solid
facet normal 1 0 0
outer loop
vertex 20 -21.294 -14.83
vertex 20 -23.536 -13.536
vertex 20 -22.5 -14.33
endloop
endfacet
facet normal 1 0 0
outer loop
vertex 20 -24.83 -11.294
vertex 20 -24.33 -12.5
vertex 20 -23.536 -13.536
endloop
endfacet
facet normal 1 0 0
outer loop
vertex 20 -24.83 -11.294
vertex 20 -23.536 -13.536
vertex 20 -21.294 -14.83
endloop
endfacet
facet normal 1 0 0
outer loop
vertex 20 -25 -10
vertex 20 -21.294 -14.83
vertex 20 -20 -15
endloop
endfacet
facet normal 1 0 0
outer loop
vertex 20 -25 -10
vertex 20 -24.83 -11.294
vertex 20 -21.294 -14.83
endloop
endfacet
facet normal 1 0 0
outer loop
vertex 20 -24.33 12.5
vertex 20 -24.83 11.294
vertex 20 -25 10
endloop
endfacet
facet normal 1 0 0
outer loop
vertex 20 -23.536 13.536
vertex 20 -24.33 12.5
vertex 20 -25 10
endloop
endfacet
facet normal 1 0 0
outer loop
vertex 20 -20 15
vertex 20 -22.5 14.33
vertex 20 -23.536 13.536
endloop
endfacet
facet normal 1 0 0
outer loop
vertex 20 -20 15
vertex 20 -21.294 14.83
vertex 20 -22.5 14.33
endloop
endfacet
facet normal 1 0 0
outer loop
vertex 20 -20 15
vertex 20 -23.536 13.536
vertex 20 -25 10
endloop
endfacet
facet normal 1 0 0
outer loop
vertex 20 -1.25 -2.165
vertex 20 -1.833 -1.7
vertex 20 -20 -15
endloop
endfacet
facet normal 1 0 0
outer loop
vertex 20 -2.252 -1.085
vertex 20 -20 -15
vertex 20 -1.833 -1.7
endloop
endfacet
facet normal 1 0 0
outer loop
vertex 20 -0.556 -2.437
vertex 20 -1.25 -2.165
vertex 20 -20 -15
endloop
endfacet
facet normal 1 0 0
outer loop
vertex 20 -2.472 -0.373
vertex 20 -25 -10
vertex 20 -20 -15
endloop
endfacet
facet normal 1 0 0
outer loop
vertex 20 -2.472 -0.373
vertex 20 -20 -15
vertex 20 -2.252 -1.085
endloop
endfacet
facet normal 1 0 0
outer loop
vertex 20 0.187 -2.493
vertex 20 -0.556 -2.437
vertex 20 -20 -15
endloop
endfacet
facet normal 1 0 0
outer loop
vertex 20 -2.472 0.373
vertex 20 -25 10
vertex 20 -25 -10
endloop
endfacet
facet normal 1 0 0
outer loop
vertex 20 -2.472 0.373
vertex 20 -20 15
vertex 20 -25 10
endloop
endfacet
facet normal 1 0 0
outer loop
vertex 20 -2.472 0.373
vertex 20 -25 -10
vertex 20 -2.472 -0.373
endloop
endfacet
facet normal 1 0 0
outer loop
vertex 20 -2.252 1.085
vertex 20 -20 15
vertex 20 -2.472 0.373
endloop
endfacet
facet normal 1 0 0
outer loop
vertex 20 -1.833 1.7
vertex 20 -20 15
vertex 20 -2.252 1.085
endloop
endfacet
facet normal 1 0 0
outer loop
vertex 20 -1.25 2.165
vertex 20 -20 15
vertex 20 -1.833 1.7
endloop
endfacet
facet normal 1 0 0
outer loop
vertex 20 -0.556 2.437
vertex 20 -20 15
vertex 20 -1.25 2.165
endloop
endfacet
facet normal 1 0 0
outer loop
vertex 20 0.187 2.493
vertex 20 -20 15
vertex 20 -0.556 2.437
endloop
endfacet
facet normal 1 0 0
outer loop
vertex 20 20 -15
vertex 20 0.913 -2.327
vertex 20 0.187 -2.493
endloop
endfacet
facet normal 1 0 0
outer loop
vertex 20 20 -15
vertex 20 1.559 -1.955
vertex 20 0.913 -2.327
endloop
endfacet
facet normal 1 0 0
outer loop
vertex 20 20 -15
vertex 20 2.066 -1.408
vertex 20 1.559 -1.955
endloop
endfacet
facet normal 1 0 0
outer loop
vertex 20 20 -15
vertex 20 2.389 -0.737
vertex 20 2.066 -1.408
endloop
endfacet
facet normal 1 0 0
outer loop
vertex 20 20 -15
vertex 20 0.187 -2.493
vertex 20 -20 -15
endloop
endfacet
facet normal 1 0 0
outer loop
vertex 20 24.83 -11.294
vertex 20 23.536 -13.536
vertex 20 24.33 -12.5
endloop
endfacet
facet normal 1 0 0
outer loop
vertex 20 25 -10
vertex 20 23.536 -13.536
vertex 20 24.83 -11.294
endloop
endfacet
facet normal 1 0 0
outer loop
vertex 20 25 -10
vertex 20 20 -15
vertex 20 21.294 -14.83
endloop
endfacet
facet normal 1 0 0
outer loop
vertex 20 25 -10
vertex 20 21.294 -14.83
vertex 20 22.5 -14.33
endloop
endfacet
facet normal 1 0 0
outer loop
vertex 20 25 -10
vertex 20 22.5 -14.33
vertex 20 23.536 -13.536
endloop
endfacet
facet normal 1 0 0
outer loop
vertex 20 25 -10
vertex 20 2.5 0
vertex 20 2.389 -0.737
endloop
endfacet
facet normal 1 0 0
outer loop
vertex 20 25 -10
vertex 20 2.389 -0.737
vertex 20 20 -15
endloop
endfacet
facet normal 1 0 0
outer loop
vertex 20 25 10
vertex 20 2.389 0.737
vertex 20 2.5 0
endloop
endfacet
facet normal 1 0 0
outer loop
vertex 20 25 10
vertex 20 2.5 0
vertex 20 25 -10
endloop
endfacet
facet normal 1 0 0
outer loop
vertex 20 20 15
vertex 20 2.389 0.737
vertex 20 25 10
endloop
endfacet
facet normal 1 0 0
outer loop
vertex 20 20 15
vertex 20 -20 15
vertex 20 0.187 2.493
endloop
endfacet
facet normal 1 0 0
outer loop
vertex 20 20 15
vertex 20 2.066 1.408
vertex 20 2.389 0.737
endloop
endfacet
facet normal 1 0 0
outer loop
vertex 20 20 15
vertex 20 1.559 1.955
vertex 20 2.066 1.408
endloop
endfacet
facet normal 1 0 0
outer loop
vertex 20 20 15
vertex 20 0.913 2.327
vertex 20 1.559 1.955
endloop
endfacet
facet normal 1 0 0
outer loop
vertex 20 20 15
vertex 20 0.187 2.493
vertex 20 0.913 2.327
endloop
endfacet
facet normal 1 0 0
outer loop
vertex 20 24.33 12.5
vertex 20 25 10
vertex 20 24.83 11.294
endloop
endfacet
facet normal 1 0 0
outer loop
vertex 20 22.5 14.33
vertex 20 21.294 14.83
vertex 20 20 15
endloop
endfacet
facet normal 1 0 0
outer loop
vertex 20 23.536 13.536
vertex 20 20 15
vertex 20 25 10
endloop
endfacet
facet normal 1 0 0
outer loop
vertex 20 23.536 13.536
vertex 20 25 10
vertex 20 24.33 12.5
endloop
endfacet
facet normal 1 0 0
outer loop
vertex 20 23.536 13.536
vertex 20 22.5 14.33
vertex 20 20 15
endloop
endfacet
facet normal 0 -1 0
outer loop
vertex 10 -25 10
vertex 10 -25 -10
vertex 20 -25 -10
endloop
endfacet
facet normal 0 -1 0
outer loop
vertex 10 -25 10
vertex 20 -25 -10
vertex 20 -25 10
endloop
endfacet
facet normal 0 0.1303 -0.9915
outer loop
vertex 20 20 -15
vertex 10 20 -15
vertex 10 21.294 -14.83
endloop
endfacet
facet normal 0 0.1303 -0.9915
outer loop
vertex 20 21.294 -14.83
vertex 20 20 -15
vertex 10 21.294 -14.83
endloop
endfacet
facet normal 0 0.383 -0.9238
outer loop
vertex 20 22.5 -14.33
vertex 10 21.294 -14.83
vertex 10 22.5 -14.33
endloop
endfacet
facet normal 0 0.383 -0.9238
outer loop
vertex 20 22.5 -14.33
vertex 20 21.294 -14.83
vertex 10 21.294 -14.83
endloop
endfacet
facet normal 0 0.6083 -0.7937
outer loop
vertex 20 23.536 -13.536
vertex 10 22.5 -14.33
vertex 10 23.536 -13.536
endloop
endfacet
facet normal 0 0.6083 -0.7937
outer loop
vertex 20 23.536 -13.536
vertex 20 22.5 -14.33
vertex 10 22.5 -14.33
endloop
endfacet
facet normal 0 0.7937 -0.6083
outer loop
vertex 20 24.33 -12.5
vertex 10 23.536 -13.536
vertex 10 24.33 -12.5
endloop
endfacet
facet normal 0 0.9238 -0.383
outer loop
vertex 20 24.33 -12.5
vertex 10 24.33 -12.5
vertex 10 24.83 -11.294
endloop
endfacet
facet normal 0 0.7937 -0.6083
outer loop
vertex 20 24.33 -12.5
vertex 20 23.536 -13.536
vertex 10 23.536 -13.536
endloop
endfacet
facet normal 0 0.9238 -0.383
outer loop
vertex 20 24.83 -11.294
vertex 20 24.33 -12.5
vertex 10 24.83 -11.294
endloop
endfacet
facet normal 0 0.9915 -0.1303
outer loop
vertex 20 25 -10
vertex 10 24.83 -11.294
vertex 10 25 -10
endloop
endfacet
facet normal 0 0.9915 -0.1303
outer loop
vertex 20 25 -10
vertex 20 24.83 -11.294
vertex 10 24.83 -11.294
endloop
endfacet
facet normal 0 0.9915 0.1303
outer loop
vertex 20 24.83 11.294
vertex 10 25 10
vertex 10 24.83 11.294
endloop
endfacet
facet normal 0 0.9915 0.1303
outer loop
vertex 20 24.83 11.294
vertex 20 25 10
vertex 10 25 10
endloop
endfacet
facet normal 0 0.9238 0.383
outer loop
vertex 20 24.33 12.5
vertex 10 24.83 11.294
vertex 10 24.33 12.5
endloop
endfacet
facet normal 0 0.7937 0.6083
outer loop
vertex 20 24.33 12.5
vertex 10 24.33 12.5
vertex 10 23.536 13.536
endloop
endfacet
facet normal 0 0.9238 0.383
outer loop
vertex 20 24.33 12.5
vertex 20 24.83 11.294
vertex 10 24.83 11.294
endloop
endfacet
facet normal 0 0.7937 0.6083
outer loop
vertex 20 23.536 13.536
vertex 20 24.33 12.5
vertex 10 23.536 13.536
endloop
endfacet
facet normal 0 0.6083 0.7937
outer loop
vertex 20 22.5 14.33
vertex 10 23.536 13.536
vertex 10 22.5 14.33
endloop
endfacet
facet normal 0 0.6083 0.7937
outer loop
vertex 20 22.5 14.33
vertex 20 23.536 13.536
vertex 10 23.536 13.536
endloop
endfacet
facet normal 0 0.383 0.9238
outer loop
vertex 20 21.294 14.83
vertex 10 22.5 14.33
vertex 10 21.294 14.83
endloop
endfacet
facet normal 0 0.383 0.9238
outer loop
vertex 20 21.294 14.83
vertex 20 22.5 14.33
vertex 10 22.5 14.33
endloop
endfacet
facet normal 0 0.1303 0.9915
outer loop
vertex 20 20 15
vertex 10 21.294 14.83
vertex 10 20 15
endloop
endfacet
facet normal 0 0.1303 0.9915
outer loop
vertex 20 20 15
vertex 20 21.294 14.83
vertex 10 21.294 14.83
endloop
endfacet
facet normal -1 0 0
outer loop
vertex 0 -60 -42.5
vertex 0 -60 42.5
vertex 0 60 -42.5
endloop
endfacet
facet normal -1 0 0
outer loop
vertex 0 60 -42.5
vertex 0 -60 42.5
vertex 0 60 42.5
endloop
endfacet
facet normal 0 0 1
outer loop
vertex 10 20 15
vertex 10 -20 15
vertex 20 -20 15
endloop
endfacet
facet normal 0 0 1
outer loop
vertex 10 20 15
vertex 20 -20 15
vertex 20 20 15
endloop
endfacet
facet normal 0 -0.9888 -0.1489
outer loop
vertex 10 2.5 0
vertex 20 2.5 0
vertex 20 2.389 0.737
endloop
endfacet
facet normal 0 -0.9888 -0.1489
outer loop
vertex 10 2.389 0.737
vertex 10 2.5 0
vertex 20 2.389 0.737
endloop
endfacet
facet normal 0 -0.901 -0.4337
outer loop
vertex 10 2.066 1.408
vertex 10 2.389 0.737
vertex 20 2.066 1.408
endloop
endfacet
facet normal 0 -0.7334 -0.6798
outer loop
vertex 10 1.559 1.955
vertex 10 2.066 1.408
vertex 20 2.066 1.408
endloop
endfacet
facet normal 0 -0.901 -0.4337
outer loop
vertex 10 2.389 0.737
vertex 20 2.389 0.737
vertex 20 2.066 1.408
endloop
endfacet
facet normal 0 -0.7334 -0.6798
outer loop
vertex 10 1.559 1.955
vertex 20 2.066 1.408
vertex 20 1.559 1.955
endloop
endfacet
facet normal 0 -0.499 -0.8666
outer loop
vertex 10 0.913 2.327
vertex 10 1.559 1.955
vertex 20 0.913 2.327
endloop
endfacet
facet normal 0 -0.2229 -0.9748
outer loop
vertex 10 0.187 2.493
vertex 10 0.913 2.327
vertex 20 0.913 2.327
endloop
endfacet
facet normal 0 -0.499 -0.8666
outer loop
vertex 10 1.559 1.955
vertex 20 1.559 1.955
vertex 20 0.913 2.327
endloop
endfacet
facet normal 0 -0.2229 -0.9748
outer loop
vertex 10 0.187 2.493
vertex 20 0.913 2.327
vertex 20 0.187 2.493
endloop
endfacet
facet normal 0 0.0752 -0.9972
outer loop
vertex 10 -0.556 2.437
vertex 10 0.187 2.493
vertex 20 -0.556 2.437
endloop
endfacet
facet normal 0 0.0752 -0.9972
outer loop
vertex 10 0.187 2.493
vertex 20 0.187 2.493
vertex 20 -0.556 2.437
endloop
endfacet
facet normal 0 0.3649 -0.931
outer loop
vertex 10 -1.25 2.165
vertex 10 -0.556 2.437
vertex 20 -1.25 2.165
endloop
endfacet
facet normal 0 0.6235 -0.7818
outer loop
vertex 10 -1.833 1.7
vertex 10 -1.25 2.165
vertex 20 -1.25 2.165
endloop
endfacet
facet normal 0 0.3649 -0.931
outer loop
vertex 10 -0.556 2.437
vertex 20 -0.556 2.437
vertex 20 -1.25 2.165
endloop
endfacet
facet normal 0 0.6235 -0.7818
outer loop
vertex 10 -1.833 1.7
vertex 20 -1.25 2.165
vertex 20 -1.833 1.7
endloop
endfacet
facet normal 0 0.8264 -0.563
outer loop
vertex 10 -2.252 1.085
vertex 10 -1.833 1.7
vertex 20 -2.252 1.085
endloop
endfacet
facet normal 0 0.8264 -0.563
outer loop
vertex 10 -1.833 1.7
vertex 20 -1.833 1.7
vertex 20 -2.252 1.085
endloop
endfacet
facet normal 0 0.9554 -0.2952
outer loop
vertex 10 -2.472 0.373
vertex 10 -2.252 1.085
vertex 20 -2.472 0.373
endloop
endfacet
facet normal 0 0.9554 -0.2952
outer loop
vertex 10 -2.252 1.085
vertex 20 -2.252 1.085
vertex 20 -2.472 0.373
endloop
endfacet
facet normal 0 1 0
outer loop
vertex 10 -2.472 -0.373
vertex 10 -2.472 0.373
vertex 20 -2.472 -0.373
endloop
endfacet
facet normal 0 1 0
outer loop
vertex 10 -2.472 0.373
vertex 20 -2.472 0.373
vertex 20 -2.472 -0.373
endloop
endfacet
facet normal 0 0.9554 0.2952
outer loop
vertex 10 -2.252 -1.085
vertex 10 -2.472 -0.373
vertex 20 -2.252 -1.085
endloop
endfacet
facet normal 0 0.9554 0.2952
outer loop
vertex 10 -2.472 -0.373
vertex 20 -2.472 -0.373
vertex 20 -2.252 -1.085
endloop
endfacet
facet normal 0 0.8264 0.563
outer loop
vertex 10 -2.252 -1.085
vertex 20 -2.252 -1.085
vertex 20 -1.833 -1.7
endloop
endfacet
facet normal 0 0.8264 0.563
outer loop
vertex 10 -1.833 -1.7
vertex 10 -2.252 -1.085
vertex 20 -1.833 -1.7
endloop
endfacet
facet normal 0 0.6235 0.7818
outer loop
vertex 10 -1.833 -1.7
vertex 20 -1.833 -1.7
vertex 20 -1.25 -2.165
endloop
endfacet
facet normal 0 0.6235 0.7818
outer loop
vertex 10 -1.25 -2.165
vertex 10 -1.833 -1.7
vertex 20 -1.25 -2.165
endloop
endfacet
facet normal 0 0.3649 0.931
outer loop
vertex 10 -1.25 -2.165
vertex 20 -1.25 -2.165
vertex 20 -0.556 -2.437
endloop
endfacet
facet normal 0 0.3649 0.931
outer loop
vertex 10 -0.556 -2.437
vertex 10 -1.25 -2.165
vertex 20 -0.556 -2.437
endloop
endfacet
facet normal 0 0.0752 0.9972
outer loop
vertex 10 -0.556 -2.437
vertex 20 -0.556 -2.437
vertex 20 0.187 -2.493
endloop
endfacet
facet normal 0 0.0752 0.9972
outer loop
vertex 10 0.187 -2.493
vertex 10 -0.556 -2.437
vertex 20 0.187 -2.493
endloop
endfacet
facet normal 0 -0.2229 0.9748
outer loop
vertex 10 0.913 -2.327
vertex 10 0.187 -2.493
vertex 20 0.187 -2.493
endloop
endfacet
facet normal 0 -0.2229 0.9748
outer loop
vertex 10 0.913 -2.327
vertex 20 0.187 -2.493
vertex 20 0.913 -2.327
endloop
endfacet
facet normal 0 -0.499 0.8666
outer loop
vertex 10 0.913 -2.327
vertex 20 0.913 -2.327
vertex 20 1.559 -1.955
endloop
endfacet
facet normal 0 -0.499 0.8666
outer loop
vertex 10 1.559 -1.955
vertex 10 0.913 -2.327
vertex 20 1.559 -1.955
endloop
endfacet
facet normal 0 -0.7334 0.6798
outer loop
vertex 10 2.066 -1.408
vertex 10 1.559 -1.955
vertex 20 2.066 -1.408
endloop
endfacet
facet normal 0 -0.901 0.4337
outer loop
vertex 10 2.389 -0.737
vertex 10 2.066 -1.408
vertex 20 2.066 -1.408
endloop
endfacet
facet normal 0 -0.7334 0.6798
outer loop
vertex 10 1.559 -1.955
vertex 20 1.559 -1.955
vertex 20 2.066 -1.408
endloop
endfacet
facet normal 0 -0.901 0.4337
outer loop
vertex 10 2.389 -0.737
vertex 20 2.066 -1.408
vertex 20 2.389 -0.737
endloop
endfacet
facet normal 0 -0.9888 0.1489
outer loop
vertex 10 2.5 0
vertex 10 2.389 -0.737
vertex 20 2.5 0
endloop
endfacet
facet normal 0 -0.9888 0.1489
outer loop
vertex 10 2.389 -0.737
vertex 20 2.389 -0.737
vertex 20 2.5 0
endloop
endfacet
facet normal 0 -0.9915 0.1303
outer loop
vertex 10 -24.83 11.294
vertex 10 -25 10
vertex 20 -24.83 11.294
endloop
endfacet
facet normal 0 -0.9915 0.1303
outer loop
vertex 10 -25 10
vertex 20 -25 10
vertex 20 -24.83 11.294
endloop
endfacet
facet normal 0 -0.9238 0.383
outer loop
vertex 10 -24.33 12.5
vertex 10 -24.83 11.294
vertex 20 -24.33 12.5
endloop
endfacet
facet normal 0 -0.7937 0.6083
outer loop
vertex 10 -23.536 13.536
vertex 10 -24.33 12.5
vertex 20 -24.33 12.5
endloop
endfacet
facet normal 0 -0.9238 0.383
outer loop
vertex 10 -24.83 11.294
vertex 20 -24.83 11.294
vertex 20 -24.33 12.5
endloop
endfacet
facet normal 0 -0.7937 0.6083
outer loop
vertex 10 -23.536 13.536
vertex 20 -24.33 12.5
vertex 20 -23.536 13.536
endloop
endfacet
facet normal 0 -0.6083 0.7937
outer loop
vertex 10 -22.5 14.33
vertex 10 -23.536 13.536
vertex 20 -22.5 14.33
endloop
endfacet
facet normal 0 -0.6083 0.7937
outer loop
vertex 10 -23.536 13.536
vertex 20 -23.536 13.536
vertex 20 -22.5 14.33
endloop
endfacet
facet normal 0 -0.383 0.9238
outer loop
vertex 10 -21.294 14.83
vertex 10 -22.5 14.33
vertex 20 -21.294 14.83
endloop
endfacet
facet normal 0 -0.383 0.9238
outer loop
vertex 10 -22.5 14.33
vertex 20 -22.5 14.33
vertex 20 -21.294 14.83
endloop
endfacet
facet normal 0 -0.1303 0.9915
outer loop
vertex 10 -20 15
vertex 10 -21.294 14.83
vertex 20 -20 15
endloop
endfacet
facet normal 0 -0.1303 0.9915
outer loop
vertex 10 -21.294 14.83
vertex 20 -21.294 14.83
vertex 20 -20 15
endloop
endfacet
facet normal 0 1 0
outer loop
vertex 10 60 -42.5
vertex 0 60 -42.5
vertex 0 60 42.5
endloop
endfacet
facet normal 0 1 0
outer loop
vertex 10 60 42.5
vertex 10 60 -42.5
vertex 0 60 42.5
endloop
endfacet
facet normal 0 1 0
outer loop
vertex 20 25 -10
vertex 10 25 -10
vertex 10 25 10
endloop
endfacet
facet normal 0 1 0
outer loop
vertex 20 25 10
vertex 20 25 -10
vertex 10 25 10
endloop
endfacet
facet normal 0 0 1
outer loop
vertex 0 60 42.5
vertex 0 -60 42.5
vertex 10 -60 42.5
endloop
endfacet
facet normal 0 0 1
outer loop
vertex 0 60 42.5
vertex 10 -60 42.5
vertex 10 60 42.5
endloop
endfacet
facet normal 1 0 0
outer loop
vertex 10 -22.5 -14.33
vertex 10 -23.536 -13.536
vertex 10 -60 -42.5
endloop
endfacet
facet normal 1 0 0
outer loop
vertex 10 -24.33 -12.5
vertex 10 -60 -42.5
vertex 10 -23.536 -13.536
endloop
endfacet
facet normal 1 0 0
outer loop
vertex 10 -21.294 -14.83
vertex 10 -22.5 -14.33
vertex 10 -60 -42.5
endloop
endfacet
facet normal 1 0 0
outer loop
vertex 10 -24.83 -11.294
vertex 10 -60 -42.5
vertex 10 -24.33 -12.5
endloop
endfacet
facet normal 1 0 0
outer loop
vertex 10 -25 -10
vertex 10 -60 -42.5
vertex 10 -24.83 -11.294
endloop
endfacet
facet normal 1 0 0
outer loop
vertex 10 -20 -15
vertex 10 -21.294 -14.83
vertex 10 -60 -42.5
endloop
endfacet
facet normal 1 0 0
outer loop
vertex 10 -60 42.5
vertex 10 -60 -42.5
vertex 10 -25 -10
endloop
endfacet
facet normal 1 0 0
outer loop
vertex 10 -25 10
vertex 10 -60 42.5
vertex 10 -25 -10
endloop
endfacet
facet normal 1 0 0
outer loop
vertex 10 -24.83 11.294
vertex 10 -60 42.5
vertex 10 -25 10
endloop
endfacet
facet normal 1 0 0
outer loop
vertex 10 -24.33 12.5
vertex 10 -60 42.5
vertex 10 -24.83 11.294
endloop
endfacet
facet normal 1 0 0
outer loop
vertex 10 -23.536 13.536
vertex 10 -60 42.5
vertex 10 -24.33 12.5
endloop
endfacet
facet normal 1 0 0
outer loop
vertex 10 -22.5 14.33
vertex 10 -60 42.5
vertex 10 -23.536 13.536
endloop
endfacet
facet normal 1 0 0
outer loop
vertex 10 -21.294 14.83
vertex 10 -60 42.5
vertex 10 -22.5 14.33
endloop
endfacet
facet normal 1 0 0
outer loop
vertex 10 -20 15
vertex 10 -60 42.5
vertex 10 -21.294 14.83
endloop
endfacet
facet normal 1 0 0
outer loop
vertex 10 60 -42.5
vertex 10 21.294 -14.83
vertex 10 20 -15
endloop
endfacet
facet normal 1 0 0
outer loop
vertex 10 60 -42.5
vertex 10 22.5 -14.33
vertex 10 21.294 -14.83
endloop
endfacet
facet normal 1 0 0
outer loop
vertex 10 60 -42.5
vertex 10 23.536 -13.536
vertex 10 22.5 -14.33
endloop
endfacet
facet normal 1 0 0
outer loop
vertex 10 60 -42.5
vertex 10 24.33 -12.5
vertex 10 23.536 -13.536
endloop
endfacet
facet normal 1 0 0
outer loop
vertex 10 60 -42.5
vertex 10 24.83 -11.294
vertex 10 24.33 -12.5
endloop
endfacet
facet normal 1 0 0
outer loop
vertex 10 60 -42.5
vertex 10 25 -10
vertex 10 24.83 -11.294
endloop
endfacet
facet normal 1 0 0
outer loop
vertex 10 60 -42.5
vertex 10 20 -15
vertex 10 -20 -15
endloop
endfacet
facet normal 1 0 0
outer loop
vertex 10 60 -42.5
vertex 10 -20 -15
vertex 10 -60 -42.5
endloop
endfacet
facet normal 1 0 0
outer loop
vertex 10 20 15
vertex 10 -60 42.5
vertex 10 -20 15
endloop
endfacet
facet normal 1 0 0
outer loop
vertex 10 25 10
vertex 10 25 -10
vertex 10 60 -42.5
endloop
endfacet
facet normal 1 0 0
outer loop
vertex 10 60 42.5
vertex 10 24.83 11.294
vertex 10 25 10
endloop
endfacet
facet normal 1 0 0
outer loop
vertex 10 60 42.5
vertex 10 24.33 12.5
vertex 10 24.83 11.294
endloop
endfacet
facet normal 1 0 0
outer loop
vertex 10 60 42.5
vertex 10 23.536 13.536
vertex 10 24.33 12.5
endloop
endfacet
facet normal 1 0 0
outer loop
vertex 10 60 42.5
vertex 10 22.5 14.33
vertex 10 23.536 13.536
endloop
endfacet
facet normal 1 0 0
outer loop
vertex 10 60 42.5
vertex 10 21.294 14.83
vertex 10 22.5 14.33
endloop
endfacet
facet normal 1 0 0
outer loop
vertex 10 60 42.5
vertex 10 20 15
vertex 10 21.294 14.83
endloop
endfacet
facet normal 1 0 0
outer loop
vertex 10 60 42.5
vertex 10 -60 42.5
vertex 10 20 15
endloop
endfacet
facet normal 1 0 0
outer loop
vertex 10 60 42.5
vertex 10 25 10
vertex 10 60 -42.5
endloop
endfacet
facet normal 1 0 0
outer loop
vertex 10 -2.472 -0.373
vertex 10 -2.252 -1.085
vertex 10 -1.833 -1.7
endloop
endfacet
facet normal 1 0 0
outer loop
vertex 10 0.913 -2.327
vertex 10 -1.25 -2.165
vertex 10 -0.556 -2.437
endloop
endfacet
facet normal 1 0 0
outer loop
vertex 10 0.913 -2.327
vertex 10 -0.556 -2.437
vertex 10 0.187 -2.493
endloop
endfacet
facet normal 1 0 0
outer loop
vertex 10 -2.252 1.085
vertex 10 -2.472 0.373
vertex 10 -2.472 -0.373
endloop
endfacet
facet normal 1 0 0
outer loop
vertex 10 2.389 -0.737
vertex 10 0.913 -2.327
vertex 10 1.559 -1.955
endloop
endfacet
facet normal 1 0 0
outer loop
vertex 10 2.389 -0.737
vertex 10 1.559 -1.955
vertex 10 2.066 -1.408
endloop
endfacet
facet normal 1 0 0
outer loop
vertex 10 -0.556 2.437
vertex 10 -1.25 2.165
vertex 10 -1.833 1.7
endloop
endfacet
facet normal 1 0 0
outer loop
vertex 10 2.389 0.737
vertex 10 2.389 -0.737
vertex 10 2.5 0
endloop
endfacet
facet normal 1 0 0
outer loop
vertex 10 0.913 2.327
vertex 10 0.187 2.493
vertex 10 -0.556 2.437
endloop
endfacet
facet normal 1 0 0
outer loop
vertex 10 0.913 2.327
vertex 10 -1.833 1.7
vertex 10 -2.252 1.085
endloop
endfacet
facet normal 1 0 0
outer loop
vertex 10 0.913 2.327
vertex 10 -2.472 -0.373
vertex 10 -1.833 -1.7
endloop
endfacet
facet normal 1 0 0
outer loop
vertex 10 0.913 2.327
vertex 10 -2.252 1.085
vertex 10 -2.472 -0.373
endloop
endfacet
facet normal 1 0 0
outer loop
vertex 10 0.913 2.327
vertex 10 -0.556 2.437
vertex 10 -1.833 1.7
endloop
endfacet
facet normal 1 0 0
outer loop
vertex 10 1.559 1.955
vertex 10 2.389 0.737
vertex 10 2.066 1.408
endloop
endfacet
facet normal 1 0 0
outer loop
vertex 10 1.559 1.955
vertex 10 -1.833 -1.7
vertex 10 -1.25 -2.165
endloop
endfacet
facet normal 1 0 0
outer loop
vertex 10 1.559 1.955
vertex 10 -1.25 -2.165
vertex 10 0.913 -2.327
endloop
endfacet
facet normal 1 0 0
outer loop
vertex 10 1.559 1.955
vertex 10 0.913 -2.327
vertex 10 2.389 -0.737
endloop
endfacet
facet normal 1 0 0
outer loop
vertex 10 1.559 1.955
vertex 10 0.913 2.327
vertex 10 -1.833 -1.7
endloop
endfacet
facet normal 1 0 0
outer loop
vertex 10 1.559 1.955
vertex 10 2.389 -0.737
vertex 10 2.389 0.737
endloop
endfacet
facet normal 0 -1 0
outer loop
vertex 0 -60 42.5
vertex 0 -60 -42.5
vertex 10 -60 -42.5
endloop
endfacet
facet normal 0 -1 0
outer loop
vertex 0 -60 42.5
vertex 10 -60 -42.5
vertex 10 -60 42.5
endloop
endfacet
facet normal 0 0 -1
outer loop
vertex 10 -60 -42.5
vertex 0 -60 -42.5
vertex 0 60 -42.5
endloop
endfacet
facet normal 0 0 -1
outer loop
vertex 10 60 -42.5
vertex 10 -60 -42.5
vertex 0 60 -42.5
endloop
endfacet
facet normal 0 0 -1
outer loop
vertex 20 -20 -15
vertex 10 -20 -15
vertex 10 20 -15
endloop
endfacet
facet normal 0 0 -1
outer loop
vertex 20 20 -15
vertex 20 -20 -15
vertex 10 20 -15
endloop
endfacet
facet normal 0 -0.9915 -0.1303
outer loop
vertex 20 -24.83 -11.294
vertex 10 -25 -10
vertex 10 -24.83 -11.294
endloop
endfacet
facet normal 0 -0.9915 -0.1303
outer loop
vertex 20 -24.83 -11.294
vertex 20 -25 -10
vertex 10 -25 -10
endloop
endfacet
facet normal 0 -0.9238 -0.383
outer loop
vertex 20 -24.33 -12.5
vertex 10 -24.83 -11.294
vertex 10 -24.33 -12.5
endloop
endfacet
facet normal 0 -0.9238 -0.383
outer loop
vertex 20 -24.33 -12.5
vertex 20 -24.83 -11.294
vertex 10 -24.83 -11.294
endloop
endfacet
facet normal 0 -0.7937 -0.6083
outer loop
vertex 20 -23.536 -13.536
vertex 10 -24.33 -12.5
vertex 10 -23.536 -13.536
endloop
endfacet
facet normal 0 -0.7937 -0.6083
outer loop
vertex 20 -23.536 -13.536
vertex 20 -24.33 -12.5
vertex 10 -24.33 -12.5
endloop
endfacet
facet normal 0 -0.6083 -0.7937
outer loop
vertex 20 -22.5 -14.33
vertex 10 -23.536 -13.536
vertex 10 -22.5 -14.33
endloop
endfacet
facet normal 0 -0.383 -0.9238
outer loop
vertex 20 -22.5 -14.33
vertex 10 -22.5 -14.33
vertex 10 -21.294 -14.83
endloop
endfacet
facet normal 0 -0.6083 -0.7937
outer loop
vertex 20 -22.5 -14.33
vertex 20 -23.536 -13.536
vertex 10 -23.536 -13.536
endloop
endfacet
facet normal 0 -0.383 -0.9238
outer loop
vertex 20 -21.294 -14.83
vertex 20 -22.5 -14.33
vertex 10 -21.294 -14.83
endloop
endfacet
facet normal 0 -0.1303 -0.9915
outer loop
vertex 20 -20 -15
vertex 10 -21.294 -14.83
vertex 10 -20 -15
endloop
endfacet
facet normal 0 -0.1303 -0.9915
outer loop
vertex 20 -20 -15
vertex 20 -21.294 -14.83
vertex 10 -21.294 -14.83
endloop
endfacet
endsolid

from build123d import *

# Parameters (mm, degrees)
F0_W     = 120
F0_H     = 85
F0_W_2   = 50
F0_H_2   = 30
F1_DEPTH = 10
F2_DEPTH = 20
F3_R     = 2.5
F4_DEPTH = 10
F5_R     = 5


with BuildPart() as f1:
    # F0 (on Right) → F1 (new body)
    with BuildSketch(Plane.YZ):
        Rectangle(F0_W, F0_H)
        Rectangle(F0_W_2, F0_H_2, mode=Mode.SUBTRACT)
        Rectangle(F0_W_2, F0_H_2)
    extrude(amount=F1_DEPTH)

    # F0 (on Right) → F2 (join)
    with BuildSketch(Plane.YZ):
        Rectangle(F0_W_2, F0_H_2)
    extrude(amount=F2_DEPTH)

    # F3 (on face) → F4 (cut)
    with BuildSketch(Plane.YZ.offset(20)):
        Circle(F3_R)
    extrude(amount=-F4_DEPTH, mode=Mode.SUBTRACT)

    # F5
    f5_edges = [f1.edges().sort_by_distance(p)[0] for p in [
        (15, -25, 15),
        (15, 25, 15),
        (15, -25, -15),
        (15, 25, -15),
    ]]
    fillet(f5_edges, radius=F5_R)


solid = f1.part
